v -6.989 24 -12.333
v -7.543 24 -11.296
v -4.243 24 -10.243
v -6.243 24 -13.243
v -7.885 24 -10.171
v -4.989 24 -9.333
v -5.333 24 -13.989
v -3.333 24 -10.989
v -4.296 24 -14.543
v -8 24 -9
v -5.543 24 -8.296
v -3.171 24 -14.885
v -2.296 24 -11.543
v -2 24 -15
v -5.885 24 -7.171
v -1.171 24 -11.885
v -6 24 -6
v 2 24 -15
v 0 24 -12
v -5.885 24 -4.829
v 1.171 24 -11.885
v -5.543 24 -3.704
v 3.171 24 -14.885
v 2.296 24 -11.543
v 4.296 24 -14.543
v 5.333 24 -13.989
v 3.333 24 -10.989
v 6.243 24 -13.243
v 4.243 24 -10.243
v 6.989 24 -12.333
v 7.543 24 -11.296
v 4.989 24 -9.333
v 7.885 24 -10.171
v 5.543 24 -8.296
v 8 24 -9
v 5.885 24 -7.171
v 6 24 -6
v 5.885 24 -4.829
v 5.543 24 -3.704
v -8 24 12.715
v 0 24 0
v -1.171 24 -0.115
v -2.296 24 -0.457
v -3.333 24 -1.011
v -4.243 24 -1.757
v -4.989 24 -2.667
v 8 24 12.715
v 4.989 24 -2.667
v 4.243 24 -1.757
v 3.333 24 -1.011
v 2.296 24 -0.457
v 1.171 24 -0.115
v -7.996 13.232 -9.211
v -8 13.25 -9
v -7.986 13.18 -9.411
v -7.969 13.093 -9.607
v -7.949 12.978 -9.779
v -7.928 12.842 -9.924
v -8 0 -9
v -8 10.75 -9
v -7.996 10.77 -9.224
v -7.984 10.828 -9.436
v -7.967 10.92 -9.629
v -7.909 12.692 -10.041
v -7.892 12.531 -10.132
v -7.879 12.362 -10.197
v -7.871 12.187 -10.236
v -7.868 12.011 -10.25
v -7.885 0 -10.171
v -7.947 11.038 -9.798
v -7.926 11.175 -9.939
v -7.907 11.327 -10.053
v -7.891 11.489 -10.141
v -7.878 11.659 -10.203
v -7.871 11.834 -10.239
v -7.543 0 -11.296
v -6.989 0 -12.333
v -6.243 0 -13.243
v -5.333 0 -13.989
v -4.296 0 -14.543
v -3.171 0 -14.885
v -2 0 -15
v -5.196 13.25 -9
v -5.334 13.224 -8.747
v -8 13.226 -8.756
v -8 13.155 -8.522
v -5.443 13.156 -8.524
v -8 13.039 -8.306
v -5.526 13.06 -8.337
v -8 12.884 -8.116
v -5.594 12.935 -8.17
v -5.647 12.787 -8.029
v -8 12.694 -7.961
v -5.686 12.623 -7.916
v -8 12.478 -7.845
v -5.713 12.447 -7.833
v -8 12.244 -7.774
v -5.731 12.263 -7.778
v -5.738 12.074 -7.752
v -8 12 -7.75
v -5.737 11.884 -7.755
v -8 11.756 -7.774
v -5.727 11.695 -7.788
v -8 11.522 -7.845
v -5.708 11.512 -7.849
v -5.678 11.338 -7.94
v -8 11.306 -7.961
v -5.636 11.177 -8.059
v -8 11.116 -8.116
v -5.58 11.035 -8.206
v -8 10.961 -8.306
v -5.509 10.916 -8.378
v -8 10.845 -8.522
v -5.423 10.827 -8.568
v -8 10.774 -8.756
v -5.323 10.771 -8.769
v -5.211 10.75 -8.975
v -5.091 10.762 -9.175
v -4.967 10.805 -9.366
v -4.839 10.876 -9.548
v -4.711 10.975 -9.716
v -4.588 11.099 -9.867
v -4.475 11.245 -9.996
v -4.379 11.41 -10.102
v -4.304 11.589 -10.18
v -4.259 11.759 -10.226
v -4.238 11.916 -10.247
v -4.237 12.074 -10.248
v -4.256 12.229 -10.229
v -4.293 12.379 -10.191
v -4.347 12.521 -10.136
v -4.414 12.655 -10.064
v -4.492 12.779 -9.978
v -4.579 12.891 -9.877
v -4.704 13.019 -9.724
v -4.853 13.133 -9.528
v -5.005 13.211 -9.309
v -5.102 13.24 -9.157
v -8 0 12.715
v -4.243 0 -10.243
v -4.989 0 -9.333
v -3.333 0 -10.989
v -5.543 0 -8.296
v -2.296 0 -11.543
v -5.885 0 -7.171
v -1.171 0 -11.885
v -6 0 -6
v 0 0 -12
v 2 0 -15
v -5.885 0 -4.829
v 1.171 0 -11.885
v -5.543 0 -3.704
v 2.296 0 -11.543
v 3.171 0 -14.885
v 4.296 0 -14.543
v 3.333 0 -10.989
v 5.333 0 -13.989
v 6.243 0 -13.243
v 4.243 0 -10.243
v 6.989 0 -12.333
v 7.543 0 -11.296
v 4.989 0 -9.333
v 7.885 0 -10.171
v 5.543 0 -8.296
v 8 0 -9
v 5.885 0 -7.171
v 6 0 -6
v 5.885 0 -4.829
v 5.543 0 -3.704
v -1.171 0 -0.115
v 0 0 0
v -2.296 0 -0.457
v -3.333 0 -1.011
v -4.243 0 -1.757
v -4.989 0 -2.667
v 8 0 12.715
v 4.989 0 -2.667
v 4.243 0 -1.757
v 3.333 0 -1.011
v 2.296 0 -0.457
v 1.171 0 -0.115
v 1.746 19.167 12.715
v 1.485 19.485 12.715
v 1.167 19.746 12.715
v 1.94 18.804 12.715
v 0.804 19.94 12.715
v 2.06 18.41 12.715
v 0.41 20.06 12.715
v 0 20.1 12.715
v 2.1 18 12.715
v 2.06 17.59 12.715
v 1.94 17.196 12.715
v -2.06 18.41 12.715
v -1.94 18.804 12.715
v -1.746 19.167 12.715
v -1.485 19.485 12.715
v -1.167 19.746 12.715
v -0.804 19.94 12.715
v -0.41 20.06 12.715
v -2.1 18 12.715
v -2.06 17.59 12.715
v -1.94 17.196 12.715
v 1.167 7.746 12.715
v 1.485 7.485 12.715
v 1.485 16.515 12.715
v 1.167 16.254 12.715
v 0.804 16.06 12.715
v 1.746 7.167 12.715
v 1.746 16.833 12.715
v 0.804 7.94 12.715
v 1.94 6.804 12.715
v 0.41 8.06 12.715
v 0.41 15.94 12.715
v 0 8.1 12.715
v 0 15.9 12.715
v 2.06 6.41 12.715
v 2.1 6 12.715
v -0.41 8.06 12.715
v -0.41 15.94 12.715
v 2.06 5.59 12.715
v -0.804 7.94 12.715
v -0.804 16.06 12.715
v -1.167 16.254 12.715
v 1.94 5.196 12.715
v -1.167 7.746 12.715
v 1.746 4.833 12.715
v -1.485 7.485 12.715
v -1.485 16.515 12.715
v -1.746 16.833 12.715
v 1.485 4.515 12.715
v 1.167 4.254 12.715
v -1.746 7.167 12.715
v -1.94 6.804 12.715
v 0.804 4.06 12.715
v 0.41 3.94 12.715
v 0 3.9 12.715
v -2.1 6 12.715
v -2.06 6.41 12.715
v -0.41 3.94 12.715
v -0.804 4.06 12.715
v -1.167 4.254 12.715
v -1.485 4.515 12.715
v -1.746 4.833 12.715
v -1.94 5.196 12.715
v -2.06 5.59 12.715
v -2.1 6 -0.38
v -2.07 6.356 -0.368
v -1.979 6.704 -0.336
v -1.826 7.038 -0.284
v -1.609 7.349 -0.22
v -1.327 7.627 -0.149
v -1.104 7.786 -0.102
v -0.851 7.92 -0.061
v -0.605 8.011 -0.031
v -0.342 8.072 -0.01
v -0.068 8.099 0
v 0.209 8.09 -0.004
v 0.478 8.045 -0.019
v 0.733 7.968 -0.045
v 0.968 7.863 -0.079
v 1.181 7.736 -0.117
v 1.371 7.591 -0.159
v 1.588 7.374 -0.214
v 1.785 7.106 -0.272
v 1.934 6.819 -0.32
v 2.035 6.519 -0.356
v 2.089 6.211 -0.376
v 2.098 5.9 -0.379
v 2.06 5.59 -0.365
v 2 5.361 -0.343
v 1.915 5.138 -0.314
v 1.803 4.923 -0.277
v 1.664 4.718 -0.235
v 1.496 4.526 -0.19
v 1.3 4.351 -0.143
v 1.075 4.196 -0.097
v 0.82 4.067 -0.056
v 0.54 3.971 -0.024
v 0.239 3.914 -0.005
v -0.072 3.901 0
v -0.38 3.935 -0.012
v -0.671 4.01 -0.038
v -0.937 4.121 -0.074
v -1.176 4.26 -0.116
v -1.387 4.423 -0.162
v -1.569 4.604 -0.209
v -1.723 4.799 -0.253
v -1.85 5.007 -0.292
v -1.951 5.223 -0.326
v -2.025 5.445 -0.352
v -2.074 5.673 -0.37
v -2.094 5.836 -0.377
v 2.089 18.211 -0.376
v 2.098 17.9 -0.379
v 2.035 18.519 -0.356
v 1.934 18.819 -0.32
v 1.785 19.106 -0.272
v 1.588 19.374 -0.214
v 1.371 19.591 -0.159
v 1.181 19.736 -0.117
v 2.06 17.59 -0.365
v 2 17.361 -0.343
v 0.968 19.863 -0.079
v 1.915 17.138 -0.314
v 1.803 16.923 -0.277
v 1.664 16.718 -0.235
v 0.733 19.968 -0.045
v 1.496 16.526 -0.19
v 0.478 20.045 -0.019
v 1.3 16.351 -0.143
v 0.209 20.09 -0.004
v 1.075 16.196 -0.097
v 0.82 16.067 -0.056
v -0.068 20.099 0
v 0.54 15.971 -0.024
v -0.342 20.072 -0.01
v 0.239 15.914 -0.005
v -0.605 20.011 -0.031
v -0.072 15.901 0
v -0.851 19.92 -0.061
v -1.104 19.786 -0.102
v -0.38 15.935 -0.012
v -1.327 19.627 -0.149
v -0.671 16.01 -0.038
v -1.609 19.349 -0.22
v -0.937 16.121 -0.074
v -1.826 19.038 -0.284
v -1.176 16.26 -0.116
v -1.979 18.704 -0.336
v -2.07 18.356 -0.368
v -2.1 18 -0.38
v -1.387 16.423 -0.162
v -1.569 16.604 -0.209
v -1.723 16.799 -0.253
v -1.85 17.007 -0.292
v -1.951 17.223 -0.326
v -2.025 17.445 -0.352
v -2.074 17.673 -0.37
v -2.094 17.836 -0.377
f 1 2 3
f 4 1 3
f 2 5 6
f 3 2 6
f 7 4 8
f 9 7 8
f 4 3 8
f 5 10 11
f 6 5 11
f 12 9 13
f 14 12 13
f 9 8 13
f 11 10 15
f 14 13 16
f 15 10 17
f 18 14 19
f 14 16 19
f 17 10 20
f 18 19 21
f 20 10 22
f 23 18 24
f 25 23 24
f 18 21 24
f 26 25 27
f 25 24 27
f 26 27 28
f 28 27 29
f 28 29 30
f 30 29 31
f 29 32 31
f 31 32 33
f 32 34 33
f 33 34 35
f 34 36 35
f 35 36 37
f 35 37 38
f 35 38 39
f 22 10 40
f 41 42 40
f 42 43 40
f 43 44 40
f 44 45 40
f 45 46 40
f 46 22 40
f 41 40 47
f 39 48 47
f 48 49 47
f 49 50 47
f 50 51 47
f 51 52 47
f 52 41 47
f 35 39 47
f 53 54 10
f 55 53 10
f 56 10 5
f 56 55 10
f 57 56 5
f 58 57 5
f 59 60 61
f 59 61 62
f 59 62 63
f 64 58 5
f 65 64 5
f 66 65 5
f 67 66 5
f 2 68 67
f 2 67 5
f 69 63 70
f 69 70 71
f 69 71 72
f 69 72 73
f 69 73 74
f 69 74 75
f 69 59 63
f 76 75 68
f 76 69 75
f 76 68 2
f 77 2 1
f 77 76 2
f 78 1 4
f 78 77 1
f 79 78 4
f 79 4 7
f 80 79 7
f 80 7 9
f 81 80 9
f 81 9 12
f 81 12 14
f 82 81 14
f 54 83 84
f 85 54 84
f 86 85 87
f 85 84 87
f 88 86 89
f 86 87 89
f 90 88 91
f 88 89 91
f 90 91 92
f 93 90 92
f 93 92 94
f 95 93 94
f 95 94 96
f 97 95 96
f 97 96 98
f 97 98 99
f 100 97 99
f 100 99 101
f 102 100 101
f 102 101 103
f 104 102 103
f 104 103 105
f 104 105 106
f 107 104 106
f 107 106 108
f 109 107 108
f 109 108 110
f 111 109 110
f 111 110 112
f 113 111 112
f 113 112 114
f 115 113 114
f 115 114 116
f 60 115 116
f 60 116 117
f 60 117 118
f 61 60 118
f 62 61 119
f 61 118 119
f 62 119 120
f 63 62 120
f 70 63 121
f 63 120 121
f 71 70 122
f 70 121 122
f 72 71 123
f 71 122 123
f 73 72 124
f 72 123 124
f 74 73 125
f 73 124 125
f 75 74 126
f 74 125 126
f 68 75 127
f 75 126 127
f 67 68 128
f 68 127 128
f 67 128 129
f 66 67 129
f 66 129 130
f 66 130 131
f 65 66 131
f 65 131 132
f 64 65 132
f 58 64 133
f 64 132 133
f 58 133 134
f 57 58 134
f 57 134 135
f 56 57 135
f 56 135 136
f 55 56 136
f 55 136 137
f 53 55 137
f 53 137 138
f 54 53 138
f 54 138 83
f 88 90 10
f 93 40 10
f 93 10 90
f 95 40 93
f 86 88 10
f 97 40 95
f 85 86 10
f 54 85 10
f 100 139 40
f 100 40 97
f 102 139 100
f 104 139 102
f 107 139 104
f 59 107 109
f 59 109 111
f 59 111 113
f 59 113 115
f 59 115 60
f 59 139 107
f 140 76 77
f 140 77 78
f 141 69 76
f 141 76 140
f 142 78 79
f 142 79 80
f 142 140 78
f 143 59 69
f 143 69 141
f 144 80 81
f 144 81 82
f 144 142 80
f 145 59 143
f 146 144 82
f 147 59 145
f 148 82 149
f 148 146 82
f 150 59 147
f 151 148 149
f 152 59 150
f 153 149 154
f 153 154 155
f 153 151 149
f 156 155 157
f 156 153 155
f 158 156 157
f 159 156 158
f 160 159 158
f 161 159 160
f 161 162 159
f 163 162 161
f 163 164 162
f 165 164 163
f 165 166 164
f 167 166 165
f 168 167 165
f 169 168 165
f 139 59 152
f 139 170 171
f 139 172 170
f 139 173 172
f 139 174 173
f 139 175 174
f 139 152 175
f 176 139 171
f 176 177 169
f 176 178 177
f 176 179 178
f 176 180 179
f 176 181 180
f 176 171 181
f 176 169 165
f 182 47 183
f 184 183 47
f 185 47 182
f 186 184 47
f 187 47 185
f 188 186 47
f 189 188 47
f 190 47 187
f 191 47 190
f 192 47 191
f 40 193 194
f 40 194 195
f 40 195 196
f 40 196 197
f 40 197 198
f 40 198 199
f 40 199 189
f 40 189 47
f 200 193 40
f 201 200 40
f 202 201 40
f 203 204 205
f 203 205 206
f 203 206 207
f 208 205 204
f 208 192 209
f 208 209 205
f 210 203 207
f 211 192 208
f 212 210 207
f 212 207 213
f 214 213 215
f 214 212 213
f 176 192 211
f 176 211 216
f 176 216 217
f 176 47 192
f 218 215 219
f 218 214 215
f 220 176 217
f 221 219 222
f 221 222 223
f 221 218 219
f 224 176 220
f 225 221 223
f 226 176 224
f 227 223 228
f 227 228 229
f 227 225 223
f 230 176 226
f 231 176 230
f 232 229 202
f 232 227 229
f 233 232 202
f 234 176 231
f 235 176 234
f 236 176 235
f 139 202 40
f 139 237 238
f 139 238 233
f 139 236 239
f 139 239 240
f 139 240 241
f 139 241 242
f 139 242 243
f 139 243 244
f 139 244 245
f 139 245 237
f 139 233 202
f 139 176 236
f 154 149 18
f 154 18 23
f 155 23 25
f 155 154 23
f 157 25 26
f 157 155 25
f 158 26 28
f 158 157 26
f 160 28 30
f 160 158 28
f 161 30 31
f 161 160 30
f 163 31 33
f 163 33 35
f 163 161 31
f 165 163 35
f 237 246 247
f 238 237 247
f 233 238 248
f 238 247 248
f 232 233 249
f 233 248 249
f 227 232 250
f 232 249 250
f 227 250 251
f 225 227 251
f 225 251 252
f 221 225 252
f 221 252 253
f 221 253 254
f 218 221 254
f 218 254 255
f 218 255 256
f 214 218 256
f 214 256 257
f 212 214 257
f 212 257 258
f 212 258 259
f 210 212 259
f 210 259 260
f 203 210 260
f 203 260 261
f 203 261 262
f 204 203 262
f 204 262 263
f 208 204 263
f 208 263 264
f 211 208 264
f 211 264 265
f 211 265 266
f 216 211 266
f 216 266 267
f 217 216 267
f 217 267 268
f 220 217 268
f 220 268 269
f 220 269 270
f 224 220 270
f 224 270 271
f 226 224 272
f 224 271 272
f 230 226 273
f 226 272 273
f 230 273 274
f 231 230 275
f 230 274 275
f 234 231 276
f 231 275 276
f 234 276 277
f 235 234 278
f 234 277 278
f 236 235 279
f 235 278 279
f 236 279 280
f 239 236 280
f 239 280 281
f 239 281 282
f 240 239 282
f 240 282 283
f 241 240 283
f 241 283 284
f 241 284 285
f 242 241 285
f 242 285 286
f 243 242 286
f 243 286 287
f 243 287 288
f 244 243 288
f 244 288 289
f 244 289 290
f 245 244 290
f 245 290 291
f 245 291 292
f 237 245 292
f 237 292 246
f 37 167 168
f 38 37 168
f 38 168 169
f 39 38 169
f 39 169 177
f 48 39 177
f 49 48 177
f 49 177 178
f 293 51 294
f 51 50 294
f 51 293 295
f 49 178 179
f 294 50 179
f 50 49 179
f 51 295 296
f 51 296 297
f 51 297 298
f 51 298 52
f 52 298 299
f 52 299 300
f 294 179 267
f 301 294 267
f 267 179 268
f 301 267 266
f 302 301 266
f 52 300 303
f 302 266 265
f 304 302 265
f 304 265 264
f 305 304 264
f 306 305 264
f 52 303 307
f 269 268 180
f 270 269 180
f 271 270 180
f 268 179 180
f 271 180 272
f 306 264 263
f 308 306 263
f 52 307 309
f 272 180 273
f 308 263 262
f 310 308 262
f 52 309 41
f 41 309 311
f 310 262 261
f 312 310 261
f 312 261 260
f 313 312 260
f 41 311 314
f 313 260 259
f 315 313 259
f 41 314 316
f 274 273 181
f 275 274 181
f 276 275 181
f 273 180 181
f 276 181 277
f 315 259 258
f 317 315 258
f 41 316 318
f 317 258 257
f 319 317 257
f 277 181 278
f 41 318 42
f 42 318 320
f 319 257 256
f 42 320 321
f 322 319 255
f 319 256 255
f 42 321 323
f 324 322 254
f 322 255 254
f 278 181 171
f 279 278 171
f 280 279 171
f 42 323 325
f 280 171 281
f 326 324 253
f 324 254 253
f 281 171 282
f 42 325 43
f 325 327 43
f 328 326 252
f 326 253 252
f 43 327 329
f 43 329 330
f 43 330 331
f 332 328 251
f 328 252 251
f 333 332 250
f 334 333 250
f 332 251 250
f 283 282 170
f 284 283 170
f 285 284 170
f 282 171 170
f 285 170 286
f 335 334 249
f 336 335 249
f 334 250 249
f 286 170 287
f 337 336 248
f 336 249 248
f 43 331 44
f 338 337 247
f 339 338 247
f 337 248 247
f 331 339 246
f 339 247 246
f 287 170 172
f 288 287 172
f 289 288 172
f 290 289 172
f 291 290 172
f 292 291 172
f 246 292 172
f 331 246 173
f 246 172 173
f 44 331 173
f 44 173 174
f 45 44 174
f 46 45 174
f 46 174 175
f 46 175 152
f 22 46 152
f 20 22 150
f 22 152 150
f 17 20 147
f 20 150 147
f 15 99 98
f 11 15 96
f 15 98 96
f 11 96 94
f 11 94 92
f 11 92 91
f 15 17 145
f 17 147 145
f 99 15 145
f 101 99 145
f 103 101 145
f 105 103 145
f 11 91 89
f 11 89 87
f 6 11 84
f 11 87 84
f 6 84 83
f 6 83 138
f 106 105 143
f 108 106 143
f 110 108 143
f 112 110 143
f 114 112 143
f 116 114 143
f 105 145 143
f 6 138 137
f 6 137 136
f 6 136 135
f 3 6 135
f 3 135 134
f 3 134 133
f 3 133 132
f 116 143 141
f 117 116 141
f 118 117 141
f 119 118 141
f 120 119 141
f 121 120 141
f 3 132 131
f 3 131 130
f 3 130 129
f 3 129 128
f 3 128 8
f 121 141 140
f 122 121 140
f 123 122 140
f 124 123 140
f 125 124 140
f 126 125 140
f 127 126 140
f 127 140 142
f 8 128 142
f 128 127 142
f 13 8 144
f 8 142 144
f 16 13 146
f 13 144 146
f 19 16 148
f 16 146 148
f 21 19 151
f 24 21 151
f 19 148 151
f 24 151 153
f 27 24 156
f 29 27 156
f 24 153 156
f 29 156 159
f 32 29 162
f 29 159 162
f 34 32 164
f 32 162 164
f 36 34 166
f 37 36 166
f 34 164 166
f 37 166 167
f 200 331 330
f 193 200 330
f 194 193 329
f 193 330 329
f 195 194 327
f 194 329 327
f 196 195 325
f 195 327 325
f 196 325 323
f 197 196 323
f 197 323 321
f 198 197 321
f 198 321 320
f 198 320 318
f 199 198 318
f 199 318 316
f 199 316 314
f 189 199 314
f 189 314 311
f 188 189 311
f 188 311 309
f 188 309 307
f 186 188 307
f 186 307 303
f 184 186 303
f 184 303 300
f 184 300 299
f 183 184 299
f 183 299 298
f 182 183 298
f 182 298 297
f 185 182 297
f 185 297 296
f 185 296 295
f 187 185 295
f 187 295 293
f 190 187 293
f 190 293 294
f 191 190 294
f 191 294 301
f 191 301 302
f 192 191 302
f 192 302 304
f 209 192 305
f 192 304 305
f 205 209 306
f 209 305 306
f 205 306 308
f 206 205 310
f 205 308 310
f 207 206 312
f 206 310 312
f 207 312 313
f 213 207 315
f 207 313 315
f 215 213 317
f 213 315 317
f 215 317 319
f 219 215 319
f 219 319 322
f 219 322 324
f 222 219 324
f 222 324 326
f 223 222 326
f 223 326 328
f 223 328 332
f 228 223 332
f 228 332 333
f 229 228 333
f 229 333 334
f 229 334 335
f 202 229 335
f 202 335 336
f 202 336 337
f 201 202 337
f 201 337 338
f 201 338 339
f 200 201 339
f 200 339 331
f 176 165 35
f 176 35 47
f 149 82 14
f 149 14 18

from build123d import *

# Parameters (mm, degrees)
F0_R     = 6
F1_DEPTH = 24
F3_D     = 4.2
F3_DEPTH = 14.4
F3_TIP   = 1.2618073
F5_D     = 2.5
F5_DEPTH = 5
F5_START = 0.1316528
F5_TIP   = 0.7510757738


with BuildPart() as f1:
    # F0 (on Front) → F1 (new body)
    with BuildSketch(Plane.XZ):
        with BuildLine():
            Line((8, 12.7148411355), (-8, 12.7148411355))
            Line((-8, 12.7148411355), (-8, -9))
            ThreePointArc((-8, -9), (-6.2426406871, -13.2426406871), (-2, -15))
            Line((-2, -15), (2, -15))
            ThreePointArc((2, -15), (6.2426406871, -13.2426406871), (8, -9))
            Line((8, -9), (8, 12.7148411355))
        make_face()
        with Locations((0, -6)):
            Circle(F0_R, mode=Mode.SUBTRACT)
    extrude(amount=-F1_DEPTH)

    # F3
    with Locations(Plane.XY.offset(12.7148411355)):
        with Locations((0, 18), (0, 6)):
            Hole(F3_D / 2, depth=F3_DEPTH)
            with Locations((0, 0, -(F3_DEPTH + F3_TIP / 2))):  # 118° drill point
                Cone(0, F3_D / 2, F3_TIP, mode=Mode.SUBTRACT)

    # F5
    # its depths count from where the whole tool has entered the part; down to there all is cleared
    with Locations(Plane(origin=(-8, 0, 0), x_dir=(0, -1, 0), z_dir=(-1, 0, 0)).offset(-F5_START)):
        with Locations((-12, -9)):
            Hole(F5_D / 2, depth=F5_DEPTH)
            with Locations((0, 0, -(F5_DEPTH + F5_TIP / 2))):  # 118° drill point
                Cone(0, F5_D / 2, F5_TIP, mode=Mode.SUBTRACT)


solid = f1.part
